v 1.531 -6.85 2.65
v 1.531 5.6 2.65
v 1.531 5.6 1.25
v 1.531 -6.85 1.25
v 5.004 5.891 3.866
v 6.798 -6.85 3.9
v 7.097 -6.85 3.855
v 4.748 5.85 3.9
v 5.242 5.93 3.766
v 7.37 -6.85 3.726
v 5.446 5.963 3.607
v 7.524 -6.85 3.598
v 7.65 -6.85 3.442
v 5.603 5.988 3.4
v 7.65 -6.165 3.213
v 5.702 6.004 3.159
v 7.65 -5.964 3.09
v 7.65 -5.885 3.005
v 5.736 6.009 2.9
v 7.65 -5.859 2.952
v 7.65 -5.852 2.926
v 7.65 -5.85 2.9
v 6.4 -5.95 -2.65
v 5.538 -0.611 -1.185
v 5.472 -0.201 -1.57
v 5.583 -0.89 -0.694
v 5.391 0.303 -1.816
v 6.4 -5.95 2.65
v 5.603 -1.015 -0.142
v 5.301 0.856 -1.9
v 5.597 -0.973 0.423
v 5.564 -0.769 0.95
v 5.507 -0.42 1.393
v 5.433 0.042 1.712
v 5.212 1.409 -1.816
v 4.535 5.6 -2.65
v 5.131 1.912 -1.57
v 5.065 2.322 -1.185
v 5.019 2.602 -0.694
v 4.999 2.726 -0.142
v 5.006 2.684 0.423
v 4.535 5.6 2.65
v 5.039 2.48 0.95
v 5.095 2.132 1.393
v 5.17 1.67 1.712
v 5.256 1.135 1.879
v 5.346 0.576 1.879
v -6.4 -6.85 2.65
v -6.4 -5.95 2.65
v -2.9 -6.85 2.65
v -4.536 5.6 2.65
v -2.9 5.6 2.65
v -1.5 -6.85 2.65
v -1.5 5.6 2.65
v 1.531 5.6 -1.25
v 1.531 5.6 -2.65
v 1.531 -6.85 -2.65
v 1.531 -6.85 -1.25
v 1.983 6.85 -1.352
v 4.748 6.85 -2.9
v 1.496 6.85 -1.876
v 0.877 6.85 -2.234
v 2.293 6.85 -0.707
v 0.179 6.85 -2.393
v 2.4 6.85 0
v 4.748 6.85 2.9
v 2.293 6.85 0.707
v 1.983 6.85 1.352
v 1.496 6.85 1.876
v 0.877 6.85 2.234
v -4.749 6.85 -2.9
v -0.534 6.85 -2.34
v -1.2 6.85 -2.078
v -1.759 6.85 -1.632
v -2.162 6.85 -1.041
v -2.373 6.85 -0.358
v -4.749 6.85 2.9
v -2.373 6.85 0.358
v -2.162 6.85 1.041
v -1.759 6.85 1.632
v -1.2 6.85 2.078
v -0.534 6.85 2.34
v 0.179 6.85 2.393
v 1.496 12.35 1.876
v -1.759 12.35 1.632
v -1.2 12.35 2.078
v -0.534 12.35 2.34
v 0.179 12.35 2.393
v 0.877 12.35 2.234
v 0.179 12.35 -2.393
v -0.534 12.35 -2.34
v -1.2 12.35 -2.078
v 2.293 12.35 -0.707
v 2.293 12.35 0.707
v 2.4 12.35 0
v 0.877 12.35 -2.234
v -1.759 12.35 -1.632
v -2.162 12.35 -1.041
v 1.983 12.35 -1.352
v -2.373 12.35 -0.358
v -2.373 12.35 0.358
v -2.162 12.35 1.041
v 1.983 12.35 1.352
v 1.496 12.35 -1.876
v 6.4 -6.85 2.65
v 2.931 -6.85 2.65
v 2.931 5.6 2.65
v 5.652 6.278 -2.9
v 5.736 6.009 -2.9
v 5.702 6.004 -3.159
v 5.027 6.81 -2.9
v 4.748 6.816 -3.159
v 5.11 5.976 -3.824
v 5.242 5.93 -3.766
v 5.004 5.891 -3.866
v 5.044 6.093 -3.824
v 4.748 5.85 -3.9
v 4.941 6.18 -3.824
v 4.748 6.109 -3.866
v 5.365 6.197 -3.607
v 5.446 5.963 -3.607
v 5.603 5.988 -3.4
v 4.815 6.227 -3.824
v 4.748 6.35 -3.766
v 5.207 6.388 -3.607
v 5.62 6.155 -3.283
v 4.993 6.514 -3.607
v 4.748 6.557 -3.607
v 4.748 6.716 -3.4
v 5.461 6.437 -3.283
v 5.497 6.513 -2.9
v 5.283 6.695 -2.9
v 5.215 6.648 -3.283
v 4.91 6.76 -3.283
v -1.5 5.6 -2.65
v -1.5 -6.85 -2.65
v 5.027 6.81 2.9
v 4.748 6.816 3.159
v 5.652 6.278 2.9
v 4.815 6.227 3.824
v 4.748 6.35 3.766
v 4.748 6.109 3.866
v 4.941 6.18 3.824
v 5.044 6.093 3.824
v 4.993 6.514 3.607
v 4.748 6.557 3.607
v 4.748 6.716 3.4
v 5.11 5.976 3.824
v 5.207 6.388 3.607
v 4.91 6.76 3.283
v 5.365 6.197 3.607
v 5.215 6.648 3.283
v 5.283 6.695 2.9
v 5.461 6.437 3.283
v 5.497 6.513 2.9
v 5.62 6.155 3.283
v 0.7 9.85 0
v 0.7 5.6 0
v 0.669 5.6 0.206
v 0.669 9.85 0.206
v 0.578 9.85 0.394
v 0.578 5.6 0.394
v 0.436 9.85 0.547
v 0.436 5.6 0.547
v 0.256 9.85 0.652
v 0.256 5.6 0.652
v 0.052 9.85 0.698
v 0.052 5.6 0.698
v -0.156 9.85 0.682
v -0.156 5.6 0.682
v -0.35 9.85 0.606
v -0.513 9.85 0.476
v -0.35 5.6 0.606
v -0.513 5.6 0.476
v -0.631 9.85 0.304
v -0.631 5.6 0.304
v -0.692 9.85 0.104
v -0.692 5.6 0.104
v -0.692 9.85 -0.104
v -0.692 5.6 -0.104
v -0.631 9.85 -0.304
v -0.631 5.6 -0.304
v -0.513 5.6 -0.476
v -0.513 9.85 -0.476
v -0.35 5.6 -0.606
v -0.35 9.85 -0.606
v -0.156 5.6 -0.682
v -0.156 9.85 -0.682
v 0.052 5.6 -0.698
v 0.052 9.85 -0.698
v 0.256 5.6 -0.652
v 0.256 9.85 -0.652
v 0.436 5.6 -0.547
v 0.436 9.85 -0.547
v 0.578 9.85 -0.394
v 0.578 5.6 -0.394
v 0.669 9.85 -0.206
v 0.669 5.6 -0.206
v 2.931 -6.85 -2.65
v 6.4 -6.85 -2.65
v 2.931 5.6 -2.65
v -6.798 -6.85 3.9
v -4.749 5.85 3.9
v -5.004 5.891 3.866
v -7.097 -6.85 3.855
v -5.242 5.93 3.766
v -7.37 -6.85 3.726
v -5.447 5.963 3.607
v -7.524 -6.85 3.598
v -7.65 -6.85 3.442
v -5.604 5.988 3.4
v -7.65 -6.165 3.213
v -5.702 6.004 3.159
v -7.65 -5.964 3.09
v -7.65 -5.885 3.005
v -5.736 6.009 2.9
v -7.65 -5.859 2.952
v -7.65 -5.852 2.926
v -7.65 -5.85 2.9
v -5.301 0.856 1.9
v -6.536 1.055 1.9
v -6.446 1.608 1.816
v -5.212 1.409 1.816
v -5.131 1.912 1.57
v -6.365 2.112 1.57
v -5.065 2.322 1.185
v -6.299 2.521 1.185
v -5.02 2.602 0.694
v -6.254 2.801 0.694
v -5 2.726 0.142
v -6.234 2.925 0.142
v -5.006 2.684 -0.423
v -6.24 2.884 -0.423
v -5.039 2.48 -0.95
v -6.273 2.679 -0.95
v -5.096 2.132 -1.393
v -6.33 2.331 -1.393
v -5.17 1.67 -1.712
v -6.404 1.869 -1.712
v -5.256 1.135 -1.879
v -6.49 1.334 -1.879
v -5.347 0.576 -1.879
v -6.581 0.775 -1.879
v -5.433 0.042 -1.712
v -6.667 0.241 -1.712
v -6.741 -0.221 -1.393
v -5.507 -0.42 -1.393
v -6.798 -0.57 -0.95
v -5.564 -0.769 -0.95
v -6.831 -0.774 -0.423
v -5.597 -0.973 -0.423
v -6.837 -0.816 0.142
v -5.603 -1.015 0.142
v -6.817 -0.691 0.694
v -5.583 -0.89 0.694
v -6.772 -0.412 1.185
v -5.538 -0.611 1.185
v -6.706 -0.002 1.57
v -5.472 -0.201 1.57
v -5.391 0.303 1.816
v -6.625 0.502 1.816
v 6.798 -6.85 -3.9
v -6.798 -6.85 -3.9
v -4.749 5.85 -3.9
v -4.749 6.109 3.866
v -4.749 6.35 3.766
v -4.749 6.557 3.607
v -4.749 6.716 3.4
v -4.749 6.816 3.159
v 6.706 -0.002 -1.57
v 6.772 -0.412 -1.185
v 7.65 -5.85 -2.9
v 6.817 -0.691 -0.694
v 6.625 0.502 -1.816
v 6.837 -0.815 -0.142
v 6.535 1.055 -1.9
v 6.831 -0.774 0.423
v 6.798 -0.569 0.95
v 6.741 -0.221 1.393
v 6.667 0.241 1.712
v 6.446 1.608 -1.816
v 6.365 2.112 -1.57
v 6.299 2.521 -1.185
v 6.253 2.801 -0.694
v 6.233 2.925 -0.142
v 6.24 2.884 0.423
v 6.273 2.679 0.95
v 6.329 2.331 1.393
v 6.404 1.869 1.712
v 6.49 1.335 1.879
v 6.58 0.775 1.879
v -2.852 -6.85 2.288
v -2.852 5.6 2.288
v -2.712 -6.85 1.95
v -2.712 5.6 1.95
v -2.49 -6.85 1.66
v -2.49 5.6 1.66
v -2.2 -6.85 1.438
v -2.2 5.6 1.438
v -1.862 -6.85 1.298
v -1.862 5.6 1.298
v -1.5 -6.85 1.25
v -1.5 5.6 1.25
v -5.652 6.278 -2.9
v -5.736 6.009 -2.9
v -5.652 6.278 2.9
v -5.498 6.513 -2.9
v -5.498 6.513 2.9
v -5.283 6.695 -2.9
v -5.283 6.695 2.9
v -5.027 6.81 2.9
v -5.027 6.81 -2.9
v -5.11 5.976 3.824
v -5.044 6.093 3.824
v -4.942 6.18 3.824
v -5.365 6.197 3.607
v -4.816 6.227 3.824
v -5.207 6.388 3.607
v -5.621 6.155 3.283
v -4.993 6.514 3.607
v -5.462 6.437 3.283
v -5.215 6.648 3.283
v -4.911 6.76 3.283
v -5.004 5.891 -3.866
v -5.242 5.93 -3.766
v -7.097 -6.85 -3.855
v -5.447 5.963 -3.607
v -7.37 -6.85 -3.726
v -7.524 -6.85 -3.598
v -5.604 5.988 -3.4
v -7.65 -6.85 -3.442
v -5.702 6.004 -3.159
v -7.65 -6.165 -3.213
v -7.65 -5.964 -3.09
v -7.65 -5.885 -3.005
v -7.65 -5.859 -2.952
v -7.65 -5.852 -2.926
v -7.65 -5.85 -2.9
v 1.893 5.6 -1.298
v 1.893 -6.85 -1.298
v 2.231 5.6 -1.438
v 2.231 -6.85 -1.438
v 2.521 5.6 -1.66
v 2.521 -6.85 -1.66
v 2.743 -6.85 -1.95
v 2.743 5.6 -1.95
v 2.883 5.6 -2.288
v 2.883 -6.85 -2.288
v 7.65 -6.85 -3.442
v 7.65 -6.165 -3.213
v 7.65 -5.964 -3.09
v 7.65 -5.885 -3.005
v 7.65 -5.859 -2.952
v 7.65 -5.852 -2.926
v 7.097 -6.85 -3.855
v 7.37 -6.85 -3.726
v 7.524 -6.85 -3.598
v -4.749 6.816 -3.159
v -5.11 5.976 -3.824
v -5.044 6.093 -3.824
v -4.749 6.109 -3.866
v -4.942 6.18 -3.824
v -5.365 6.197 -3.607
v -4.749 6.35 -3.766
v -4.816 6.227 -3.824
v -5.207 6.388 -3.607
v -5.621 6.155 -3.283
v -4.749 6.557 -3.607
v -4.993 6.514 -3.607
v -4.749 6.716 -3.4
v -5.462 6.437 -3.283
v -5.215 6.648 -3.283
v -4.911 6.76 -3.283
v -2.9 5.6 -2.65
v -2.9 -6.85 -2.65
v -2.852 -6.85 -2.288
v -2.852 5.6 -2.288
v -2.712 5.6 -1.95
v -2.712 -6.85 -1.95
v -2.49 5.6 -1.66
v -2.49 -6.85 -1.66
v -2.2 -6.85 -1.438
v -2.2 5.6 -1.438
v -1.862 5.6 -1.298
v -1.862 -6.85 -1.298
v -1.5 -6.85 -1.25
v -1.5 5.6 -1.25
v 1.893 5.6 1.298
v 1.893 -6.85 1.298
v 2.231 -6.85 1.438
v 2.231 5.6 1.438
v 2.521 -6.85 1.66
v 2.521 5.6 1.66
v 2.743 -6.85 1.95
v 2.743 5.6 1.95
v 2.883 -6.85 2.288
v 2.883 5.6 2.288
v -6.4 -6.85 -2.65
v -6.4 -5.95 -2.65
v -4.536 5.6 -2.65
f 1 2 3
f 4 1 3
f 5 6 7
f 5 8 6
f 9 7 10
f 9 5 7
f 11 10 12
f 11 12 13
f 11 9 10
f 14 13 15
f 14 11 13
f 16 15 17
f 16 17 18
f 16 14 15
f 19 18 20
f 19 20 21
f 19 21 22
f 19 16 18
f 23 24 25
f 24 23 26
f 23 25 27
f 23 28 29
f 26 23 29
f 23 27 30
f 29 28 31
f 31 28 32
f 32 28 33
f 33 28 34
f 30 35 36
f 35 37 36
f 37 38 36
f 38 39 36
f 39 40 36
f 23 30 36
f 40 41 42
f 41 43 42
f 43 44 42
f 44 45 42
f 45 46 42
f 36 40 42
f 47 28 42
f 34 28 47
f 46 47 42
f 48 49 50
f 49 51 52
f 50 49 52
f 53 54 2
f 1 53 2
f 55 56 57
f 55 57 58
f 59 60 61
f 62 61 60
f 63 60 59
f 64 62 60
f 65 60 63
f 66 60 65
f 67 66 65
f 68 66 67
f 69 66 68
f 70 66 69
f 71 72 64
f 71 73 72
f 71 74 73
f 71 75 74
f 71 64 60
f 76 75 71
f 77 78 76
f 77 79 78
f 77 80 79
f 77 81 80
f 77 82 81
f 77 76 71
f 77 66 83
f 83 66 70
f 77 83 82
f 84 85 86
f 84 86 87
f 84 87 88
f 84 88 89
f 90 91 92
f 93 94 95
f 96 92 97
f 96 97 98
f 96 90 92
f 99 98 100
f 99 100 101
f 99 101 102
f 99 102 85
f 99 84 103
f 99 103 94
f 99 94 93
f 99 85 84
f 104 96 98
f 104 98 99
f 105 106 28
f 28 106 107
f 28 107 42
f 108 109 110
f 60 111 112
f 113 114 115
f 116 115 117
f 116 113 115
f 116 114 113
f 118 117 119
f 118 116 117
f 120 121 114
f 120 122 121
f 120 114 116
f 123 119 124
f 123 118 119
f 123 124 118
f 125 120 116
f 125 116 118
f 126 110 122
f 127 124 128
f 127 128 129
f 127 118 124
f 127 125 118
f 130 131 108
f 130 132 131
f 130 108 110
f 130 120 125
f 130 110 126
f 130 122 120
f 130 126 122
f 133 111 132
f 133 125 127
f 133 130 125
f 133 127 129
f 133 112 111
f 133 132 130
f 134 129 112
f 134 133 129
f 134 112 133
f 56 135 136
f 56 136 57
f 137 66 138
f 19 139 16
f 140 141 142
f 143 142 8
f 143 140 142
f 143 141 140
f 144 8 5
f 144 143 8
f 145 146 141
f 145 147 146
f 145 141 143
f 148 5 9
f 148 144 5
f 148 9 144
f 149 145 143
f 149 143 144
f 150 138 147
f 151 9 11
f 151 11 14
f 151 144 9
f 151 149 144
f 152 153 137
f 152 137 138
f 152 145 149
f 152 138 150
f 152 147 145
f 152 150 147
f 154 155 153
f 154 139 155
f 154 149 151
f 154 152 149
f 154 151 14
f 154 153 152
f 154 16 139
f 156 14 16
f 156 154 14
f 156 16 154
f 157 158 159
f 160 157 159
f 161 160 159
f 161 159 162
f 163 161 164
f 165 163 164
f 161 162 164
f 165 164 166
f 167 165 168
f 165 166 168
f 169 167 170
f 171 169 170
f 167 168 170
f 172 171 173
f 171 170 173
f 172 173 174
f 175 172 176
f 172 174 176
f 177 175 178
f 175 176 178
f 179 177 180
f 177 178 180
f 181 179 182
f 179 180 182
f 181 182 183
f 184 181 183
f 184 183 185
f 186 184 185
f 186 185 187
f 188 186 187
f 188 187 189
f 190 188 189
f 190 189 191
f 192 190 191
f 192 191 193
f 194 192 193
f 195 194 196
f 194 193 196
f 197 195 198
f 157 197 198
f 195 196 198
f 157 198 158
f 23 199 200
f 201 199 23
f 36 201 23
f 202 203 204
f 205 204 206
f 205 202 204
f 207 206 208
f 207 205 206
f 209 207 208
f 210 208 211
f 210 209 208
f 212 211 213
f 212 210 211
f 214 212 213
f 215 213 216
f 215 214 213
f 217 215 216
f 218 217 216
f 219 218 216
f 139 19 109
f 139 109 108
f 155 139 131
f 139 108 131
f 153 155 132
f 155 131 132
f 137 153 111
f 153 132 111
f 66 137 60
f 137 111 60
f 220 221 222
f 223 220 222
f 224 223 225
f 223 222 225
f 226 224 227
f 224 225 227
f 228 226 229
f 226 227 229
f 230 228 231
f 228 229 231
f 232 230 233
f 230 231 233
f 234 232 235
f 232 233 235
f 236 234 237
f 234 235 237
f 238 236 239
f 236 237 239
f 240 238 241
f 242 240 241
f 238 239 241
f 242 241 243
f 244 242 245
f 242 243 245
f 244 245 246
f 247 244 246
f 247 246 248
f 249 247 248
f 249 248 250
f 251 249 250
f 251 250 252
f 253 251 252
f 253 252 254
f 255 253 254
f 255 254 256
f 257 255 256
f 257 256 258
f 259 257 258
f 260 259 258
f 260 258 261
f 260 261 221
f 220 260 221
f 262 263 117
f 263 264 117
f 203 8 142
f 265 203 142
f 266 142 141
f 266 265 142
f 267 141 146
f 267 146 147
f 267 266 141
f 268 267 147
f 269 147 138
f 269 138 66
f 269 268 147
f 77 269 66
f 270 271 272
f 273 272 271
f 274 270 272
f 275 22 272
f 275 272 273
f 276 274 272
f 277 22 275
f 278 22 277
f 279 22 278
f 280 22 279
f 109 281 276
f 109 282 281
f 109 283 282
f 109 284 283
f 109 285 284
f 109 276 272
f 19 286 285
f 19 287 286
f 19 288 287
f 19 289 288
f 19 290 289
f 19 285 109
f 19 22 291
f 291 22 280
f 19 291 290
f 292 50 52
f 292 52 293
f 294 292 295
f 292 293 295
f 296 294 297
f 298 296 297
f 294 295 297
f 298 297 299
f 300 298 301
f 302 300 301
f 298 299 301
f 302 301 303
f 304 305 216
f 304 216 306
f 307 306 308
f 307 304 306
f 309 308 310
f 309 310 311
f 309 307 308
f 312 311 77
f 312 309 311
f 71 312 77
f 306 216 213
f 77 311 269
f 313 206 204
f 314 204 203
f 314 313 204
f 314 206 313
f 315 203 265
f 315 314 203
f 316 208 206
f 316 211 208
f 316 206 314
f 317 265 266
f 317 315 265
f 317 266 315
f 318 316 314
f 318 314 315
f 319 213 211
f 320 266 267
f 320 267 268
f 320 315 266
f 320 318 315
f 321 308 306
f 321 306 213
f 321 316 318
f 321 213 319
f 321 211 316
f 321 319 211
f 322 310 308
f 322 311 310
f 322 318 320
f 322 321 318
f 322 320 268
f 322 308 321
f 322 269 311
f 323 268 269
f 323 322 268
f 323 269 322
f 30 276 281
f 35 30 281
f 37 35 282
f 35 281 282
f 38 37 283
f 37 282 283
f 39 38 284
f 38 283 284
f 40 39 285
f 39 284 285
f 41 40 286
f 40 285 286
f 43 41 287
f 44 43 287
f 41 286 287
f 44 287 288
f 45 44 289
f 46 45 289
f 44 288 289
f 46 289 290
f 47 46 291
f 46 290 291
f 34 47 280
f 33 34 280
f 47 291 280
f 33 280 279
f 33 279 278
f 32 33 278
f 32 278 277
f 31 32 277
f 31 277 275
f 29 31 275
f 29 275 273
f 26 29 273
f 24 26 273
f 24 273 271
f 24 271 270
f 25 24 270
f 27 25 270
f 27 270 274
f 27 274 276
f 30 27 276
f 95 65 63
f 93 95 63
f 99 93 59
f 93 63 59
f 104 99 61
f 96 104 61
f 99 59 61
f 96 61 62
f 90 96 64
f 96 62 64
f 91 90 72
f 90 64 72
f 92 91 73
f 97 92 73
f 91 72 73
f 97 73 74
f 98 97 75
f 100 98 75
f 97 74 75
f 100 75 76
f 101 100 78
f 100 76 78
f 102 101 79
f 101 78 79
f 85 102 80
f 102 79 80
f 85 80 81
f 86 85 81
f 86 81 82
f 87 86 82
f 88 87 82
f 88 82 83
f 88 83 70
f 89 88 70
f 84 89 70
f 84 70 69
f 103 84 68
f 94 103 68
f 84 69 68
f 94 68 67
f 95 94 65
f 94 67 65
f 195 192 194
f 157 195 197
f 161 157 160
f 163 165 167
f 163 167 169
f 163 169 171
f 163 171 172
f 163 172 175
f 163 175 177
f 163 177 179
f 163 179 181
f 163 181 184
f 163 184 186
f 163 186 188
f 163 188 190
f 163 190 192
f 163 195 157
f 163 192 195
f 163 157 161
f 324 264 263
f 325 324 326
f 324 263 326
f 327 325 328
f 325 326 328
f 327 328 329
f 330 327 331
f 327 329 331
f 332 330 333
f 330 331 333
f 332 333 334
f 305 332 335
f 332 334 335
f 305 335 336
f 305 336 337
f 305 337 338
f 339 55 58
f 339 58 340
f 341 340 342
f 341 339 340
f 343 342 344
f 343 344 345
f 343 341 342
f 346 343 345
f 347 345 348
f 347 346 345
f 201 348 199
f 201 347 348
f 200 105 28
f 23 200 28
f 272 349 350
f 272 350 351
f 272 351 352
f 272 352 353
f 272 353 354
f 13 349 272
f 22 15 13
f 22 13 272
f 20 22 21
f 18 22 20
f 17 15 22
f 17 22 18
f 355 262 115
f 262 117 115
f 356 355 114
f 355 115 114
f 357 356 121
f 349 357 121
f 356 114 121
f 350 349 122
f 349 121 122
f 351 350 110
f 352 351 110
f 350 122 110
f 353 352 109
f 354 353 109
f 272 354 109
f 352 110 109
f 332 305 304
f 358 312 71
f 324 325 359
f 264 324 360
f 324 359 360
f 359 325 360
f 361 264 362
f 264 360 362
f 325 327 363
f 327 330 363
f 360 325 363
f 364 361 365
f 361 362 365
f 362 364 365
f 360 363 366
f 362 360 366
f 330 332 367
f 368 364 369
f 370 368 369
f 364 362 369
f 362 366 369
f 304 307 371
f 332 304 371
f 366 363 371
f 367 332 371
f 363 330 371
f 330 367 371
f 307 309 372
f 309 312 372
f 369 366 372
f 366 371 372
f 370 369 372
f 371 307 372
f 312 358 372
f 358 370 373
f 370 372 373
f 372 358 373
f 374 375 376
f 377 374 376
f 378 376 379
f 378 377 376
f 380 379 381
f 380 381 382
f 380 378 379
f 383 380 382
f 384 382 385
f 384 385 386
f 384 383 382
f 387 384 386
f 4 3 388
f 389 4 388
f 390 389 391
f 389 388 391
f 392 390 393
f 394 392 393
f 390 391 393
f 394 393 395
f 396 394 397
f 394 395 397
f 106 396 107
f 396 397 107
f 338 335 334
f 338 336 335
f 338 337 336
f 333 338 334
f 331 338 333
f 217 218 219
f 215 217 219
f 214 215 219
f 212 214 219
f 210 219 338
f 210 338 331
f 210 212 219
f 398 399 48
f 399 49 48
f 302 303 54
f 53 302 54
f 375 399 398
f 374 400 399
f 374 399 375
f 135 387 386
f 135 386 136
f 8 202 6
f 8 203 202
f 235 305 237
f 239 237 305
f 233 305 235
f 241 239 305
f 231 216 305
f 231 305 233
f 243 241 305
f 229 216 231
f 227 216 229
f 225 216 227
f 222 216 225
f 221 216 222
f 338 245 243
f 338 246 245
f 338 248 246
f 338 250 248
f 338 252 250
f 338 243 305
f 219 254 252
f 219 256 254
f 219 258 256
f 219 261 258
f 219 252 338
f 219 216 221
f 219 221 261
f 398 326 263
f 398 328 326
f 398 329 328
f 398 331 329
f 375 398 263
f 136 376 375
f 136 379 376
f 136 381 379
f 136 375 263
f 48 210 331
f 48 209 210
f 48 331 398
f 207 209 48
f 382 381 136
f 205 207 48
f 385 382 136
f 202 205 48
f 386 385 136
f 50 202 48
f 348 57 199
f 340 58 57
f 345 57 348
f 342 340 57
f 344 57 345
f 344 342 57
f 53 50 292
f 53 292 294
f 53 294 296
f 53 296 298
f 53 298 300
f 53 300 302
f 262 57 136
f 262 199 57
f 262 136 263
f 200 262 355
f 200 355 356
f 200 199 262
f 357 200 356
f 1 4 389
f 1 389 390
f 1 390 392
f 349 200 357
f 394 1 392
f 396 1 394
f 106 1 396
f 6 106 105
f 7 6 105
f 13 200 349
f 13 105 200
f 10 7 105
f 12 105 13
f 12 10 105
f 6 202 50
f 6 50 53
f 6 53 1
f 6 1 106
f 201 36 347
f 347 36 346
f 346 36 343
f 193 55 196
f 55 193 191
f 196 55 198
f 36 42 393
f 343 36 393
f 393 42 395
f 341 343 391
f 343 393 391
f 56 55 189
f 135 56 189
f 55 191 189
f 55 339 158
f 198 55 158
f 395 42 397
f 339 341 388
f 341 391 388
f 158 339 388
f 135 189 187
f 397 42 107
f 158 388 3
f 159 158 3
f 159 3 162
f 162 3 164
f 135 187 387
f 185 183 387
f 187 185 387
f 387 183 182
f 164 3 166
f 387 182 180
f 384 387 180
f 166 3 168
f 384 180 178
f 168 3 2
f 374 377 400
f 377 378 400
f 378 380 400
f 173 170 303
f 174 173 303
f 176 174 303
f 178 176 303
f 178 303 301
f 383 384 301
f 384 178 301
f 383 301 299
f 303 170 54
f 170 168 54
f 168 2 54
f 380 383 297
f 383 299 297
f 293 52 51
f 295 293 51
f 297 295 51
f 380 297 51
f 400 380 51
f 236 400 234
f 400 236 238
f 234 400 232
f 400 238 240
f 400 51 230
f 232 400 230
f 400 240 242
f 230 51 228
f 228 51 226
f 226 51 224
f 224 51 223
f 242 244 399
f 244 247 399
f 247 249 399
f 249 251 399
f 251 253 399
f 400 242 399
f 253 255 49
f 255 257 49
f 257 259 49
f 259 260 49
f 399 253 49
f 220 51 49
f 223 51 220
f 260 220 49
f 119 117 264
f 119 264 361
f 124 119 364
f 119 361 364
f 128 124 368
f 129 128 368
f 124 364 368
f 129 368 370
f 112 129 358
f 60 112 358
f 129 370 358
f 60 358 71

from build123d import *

# Parameters (mm, degrees)
BOSS_EXTRUDE1_DEPTH = 3.9
SHELL5_T            = -1.25
SKETCH2_R           = 2.4
BOSS_EXTRUDE2_DEPTH = 5.5
BOSS_EXTRUDE3_DEPTH = 12.45
SKETCH6_R           = 0.7
CUT_EXTRUDE2_DEPTH  = 4.25
CUT_EXTRUDE3_REACH  = 17.264
SKETCH7_R           = 1.9
CUT_EXTRUDE4_REACH  = 17.264
SKETCH8_R           = 1.9
FILLET1_R           = 1


with BuildPart() as part:
    # Sketch1 → Boss-Extrude1 (new body, symmetric)
    with BuildSketch(Plane.XY):
        Polygon((-7.65, -5.85), (-7.65, -6.85), (7.65, -6.85), (7.65, -5.85), (5.599872407, 6.85), (-5.600127593, 6.85), align=None)
    extrude(amount=BOSS_EXTRUDE1_DEPTH, both=True)

    # Shell5
    shell5_openings = [part.faces().sort_by_distance(p)[0] for p in [
        (0, -6.85, 0),
    ]]
    offset(amount=SHELL5_T, openings=shell5_openings, kind=Kind.INTERSECTION)

    # Sketch2 → Boss-Extrude2 (add)
    with BuildSketch(Plane(origin=(0, 6.85, 0), x_dir=(1, 0, 0), z_dir=(0, 1, 0))):
        Circle(SKETCH2_R)
    extrude(amount=BOSS_EXTRUDE2_DEPTH)

    # Sketch5 → Boss-Extrude3 (add, through all)
    with BuildSketch(Plane.XZ.offset(-5.6)):
        with BuildLine():
            Line((-1.5, 1.25), (-1.5, 2.65))
            Line((-1.5, 2.65), (-2.9, 2.65))
            ThreePointArc((-2.9, 2.65), (-2.489949494, 1.660050506), (-1.5, 1.25))
        make_face()
        with BuildLine():
            Line((1.530768156, 2.65), (1.530768156, 1.25))
            ThreePointArc((1.530768156, 1.25), (2.52071765, 1.660050506), (2.930768156, 2.65))
            Line((2.930768156, 2.65), (1.530768156, 2.65))
        make_face()
        with BuildLine():
            Line((-1.5, -1.25), (-1.5, -2.65))
            Line((-1.5, -2.65), (-2.9, -2.65))
            ThreePointArc((-2.9, -2.65), (-2.489949494, -1.660050506), (-1.5, -1.25))
        make_face()
        with BuildLine():
            Line((1.530768156, -2.65), (1.530768156, -1.25))
            ThreePointArc((1.530768156, -1.25), (2.52071765, -1.660050506), (2.930768156, -2.65))
            Line((2.930768156, -2.65), (1.530768156, -2.65))
        make_face()
    extrude(amount=BOSS_EXTRUDE3_DEPTH)

    # Sketch6 → Cut-Extrude2 (cut)
    with BuildSketch(Plane.XZ.offset(-5.6)):
        Circle(SKETCH6_R)
    extrude(amount=-CUT_EXTRUDE2_DEPTH, mode=Mode.SUBTRACT)

    # Sketch7 → Cut-Extrude3 (cut, up to next)
    with BuildSketch(Plane(origin=(6.535346626, 1.054983815, 0), x_dir=(0, 0, -1), z_dir=(0.987219843, 0.159364302, 0)), mode=Mode.PRIVATE) as cut_extrude3_sk1:
        Circle(SKETCH7_R)
    cut_extrude3_tool1 = extrude(cut_extrude3_sk1.sketch, amount=-CUT_EXTRUDE3_REACH, mode=Mode.PRIVATE) & part.part
    add(cut_extrude3_tool1.solids().sort_by_distance((6.535347, 1.054984, 0))[0], mode=Mode.SUBTRACT)

    # Sketch8 → Cut-Extrude4 (cut, up to next)
    with BuildSketch(Plane(origin=(-6.535502505, 1.054877658, 0), x_dir=(0, 0, 1), z_dir=(-0.987222964, 0.15934497, 0)), mode=Mode.PRIVATE) as cut_extrude4_sk1:
        Circle(SKETCH8_R)
    cut_extrude4_tool1 = extrude(cut_extrude4_sk1.sketch, amount=-CUT_EXTRUDE4_REACH, mode=Mode.PRIVATE) & part.part
    add(cut_extrude4_tool1.solids().sort_by_distance((-6.535503, 1.054878, 0))[0], mode=Mode.SUBTRACT)

    # Fillet1
    fillet1_edges = [part.edges().sort_by_distance(p)[0] for p in [
        (-6.625063797, 0.5, -3.9),
        (6.624936203, 0.5, -3.9),
        (-0.000127593, 6.85, -3.9),
        (-5.600127593, 6.85, 0),
        (-6.625063797, 0.5, 3.9),
        (-0.000127593, 6.85, 3.9),
        (6.624936203, 0.5, 3.9),
        (5.599872407, 6.85, 0),
    ]]
    fillet(fillet1_edges, radius=FILLET1_R)


solid = part.part
